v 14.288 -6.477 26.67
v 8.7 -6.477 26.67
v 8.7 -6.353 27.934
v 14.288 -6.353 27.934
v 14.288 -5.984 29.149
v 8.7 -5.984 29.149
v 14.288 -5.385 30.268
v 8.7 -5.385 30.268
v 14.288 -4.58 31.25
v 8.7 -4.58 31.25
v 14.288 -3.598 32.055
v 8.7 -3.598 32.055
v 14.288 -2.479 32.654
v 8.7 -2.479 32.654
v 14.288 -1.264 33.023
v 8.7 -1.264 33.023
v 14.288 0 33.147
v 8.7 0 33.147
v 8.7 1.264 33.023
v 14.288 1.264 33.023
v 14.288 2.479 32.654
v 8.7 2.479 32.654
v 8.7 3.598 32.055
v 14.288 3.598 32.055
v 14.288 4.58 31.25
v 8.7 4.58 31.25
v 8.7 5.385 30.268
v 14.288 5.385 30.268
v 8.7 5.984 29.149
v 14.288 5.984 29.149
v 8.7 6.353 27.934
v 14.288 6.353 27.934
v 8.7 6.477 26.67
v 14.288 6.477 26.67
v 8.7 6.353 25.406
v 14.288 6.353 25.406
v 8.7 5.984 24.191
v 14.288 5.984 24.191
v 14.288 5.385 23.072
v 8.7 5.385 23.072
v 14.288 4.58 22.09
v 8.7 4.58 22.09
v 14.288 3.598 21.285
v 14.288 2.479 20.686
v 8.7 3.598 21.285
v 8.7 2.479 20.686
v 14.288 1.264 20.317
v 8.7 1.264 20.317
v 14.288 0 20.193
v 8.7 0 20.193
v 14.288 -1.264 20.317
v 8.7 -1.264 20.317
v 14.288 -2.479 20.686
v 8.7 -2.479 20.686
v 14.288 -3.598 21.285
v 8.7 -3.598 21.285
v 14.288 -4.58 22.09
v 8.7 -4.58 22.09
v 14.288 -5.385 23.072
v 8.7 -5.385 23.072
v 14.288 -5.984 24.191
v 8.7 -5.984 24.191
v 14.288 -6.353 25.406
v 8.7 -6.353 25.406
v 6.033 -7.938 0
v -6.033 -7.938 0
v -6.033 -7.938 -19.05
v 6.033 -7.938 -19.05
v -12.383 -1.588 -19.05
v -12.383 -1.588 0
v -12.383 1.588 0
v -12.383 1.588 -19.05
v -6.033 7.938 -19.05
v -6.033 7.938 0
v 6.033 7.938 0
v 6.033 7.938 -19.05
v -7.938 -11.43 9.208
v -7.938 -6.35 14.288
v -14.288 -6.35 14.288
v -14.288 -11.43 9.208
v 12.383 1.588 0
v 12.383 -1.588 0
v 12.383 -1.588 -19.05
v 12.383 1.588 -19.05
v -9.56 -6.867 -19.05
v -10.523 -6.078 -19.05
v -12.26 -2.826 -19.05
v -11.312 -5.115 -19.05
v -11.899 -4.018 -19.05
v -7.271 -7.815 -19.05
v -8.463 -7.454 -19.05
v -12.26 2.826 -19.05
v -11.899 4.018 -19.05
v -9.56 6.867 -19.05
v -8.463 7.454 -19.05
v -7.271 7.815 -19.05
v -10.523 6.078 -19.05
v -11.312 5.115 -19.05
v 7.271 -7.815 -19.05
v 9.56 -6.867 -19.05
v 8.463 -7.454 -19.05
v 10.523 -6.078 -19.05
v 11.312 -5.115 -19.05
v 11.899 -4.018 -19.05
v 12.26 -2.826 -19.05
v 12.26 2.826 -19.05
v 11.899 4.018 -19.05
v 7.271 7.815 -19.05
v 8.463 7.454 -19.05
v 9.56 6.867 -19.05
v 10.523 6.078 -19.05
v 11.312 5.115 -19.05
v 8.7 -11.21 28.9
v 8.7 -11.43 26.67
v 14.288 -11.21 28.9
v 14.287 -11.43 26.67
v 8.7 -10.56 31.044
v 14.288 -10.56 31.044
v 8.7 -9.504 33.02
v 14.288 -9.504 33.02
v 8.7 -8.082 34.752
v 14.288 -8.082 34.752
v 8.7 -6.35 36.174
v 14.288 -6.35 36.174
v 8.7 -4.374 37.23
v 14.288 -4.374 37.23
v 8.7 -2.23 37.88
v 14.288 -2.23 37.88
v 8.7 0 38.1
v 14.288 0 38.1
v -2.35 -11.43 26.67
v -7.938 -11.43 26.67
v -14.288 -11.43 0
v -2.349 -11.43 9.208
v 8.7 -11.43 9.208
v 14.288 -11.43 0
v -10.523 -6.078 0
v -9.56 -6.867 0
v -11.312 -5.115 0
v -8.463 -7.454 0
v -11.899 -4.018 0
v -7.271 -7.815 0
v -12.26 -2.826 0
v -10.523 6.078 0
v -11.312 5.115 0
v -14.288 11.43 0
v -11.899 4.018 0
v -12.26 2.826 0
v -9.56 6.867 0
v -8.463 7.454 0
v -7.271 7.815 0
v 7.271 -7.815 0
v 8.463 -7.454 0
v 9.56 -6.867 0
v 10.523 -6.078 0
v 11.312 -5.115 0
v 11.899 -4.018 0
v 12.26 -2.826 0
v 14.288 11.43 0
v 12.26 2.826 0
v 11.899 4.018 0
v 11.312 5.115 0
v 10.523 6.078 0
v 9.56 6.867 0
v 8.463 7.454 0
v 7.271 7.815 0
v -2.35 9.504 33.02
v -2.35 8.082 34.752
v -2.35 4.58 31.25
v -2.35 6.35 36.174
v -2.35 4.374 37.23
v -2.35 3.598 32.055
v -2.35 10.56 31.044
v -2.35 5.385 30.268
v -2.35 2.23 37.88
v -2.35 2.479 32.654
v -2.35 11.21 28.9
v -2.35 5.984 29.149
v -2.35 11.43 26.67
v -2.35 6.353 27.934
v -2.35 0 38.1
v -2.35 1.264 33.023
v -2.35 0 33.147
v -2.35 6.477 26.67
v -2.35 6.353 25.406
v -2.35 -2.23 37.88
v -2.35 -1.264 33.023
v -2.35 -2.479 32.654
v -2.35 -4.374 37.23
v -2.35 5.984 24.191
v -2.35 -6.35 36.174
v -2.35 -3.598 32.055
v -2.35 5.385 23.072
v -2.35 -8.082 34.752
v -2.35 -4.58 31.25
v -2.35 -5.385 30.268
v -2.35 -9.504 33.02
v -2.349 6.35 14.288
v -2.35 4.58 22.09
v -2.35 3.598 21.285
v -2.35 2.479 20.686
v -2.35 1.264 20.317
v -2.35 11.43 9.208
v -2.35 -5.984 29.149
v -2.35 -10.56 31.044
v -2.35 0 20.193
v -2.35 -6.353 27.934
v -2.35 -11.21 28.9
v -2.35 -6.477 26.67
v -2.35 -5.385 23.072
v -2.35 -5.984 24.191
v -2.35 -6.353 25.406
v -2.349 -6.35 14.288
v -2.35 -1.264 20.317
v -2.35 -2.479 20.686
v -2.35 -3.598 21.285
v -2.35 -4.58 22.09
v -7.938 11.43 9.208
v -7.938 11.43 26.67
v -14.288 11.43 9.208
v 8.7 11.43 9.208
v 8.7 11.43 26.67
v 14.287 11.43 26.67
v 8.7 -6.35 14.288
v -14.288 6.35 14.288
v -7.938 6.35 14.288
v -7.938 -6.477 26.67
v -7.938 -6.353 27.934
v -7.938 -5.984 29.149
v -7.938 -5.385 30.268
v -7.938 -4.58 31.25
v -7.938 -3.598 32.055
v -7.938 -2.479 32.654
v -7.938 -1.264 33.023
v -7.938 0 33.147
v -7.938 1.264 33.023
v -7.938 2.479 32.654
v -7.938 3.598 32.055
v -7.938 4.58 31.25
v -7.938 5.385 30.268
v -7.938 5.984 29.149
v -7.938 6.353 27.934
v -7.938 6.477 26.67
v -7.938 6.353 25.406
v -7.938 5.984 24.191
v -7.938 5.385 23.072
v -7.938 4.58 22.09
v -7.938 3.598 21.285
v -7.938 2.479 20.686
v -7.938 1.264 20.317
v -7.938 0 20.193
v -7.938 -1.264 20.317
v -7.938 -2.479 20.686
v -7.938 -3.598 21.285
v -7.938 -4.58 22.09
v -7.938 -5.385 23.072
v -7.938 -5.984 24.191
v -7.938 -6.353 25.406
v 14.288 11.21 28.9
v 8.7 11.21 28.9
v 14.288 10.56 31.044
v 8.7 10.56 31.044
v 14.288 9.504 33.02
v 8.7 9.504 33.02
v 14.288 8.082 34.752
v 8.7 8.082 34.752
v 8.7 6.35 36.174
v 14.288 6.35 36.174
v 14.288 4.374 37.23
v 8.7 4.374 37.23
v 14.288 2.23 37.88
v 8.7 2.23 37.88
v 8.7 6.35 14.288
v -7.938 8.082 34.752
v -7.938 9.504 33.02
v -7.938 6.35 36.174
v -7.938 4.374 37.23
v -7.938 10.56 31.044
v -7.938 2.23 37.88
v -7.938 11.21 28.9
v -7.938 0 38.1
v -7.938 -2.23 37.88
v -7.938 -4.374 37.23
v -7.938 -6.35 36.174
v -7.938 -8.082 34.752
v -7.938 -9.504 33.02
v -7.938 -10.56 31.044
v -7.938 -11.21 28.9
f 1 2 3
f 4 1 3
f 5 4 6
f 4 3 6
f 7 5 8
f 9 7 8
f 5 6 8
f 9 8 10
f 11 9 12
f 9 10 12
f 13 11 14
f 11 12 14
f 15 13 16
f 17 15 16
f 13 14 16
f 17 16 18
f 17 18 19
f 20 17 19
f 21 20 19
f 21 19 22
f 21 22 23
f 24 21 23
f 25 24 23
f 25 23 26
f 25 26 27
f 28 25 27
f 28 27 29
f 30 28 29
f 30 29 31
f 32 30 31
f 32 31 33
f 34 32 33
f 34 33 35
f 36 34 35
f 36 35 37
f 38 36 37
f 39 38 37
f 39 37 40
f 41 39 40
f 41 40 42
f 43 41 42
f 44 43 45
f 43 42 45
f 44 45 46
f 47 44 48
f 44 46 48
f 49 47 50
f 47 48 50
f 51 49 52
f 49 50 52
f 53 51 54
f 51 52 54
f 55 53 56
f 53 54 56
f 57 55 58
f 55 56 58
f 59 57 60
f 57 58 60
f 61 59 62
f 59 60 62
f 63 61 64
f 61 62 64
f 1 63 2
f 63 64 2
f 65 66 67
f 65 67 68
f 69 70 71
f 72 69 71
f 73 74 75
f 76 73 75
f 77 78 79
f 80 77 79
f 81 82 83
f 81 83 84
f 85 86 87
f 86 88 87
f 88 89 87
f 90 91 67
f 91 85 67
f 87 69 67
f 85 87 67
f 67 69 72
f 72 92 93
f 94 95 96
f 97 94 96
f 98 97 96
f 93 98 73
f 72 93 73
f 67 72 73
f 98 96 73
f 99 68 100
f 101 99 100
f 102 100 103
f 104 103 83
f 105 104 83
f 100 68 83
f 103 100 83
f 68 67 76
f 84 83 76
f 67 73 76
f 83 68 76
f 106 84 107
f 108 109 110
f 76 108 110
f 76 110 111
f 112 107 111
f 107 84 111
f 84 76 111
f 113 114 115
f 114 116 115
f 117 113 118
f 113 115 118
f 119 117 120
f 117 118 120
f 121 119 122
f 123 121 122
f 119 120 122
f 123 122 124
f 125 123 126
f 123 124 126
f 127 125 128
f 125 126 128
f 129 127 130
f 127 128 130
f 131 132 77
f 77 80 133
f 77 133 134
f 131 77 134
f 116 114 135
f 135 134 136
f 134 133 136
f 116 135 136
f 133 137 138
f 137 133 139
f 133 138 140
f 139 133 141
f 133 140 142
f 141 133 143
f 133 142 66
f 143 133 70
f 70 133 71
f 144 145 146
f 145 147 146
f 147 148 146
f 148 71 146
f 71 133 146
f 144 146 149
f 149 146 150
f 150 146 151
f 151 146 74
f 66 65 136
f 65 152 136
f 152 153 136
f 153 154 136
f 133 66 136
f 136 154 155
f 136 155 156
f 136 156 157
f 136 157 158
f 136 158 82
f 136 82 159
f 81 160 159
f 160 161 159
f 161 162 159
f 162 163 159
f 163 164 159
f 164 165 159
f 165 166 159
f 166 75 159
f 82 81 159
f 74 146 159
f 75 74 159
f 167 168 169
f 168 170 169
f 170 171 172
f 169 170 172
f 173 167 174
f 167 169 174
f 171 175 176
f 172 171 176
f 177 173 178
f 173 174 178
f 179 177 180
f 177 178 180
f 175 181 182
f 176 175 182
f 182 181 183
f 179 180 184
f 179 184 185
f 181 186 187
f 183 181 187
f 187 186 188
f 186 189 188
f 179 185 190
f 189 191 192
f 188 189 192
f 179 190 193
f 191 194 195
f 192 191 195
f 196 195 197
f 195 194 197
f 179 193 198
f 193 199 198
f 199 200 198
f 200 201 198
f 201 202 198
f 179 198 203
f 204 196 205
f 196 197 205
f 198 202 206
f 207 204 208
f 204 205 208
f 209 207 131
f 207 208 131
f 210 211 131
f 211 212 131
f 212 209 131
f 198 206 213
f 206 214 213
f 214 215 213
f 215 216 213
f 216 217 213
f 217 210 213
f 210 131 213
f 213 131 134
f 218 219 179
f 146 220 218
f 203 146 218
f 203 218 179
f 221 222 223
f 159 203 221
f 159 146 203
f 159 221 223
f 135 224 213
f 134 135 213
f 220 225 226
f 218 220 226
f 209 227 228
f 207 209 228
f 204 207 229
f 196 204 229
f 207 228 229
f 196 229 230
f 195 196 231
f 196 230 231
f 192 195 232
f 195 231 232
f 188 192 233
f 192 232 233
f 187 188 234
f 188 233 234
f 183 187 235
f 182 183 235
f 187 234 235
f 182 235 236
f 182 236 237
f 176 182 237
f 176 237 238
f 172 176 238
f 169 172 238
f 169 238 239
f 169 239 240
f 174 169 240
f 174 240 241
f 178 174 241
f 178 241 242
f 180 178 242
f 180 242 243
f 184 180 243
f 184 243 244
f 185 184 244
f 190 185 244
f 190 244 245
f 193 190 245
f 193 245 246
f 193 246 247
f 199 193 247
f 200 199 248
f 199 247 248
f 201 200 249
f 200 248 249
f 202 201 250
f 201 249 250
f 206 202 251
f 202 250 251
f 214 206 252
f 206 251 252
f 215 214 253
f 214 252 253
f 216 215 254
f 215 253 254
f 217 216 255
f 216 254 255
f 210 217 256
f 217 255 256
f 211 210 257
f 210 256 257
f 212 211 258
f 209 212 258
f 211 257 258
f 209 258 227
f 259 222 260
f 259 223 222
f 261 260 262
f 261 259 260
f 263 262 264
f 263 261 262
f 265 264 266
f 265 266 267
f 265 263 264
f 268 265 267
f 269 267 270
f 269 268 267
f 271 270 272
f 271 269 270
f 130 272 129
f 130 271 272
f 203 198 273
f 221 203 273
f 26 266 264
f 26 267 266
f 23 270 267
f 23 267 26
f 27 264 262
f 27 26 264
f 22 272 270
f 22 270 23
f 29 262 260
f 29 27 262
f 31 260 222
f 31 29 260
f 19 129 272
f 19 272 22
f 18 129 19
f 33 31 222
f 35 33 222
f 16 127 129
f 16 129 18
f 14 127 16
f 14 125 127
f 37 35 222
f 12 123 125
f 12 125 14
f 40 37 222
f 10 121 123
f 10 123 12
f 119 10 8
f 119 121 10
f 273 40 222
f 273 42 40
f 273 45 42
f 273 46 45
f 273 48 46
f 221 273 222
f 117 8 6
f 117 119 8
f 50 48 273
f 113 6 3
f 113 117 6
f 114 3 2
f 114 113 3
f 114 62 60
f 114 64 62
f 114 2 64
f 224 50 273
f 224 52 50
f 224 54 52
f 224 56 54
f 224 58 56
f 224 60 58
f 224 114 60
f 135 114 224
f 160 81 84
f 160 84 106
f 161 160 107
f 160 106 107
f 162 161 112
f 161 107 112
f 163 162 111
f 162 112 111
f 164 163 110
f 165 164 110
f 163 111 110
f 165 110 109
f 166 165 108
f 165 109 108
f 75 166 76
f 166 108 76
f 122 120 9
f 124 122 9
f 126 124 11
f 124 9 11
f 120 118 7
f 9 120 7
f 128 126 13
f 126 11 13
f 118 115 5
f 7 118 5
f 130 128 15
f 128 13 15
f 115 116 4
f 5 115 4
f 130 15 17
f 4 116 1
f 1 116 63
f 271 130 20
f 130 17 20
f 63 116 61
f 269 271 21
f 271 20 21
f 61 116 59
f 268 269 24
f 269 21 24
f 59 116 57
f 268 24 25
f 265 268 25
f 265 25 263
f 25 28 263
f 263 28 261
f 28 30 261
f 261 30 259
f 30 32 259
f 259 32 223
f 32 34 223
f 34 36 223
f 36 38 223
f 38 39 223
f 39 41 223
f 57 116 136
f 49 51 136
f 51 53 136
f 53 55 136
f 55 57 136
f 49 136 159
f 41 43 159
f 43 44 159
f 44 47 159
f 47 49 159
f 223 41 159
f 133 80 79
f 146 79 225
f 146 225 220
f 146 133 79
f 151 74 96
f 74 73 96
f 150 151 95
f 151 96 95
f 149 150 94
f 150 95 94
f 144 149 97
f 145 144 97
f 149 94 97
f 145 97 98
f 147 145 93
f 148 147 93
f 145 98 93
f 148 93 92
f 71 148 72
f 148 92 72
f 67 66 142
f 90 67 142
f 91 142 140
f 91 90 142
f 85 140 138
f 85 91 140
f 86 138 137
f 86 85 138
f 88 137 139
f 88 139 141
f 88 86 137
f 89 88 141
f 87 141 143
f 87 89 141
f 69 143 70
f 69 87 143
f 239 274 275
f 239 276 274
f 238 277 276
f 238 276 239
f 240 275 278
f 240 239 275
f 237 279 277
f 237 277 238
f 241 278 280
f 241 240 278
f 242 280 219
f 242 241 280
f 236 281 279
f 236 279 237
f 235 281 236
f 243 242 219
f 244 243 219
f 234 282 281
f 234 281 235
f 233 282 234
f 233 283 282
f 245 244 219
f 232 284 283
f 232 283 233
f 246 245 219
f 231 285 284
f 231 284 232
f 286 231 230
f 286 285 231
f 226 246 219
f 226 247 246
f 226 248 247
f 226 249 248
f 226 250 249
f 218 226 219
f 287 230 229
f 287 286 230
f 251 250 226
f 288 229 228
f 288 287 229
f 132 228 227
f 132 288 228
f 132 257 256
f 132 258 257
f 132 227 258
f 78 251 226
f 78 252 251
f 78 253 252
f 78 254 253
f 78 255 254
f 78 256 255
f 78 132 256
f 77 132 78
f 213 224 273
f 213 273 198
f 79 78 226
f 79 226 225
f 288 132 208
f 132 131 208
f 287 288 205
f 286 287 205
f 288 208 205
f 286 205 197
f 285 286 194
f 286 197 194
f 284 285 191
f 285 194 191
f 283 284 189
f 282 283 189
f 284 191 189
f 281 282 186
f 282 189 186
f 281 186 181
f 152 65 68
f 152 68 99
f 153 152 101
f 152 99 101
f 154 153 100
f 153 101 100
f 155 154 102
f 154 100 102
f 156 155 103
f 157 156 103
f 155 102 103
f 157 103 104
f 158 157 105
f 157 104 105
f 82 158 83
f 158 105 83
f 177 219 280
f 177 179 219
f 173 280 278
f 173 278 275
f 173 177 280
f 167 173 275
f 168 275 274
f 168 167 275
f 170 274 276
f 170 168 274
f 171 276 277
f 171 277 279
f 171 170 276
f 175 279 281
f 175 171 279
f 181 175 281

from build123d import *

# Parameters (mm, degrees)
SKETCH2_W           = 24.765
SKETCH2_H           = 15.875
BOSS_EXTRUDE1_DEPTH = 19.05
SKETCH3_W           = 28.575
SKETCH3_H           = 22.86
BOSS_EXTRUDE2_DEPTH = 38.1
SKETCH4_W           = 6.35
SKETCH4_H           = 23.8125
SKETCH4_W_2         = 11.049
CUT_EXTRUDE1_DEPTH  = 47.6725
FILLET5_R           = 11.43
SKETCH7_R           = 6.477
CUT_EXTRUDE3_DEPTH  = 46.56539833
FILLET3_R           = 6.35
CHAMFER1_SIZE       = 5.08


with BuildPart() as part:
    # Sketch2 → Boss-Extrude1 (new body)
    with BuildSketch(Plane.XY):
        Rectangle(SKETCH2_W, SKETCH2_H)
    extrude(amount=-BOSS_EXTRUDE1_DEPTH)

    # Sketch3 → Boss-Extrude2 (add)
    with BuildSketch(Plane.XY):
        Rectangle(SKETCH3_W, SKETCH3_H)
    extrude(amount=BOSS_EXTRUDE2_DEPTH)

    # Sketch4 → Cut-Extrude1 (cut, through all)
    with BuildSketch(Plane(origin=(0, -11.43, 0), x_dir=(-1, 0, 0), z_dir=(0, -1, 0))):
        with Locations((11.1125, -26.19375)):
            Rectangle(SKETCH4_W, SKETCH4_H)
        with Locations((-3.175, -26.19375)):
            Rectangle(SKETCH4_W_2, SKETCH4_H)
    extrude(amount=-CUT_EXTRUDE1_DEPTH, mode=Mode.SUBTRACT)

    # Fillet5
    fillet5_edges = [part.edges().sort_by_distance(p)[0] for p in [
        (-5.1435, -11.43, 38.1),
        (-5.1435, 11.43, 38.1),
        (11.4935, 11.43, 38.1),
        (11.4935, -11.43, 38.1),
    ]]
    fillet(fillet5_edges, radius=FILLET5_R - 0.0001)  # a hair under: the kernel refuses the full size

    # Sketch7 → Cut-Extrude3 (cut, through all)
    with BuildSketch(Plane.ZY.offset(7.9375)):
        with Locations(Location((26.67, 0, 0), (0, 0, 270))):
            Circle(SKETCH7_R)
    extrude(amount=-CUT_EXTRUDE3_DEPTH, mode=Mode.SUBTRACT)

    # Fillet3
    fillet3_edges = [part.edges().sort_by_distance(p)[0] for p in [
        (-12.3825, 7.9375, -9.525),
        (12.3825, 7.9375, -9.525),
        (12.3825, -7.9375, -9.525),
        (-12.3825, -7.9375, -9.525),
    ]]
    fillet(fillet3_edges, radius=FILLET3_R)

    # Chamfer1
    chamfer1_edges = [part.edges().sort_by_distance(p)[0] for p in [
        (-11.1125, 11.43, 14.2875),
        (-11.1125, -11.43, 14.2875),
        (3.175, 11.43, 14.2875),
        (3.175, -11.43, 14.2875),
    ]]
    chamfer(chamfer1_edges, length=CHAMFER1_SIZE)


solid = part.part
